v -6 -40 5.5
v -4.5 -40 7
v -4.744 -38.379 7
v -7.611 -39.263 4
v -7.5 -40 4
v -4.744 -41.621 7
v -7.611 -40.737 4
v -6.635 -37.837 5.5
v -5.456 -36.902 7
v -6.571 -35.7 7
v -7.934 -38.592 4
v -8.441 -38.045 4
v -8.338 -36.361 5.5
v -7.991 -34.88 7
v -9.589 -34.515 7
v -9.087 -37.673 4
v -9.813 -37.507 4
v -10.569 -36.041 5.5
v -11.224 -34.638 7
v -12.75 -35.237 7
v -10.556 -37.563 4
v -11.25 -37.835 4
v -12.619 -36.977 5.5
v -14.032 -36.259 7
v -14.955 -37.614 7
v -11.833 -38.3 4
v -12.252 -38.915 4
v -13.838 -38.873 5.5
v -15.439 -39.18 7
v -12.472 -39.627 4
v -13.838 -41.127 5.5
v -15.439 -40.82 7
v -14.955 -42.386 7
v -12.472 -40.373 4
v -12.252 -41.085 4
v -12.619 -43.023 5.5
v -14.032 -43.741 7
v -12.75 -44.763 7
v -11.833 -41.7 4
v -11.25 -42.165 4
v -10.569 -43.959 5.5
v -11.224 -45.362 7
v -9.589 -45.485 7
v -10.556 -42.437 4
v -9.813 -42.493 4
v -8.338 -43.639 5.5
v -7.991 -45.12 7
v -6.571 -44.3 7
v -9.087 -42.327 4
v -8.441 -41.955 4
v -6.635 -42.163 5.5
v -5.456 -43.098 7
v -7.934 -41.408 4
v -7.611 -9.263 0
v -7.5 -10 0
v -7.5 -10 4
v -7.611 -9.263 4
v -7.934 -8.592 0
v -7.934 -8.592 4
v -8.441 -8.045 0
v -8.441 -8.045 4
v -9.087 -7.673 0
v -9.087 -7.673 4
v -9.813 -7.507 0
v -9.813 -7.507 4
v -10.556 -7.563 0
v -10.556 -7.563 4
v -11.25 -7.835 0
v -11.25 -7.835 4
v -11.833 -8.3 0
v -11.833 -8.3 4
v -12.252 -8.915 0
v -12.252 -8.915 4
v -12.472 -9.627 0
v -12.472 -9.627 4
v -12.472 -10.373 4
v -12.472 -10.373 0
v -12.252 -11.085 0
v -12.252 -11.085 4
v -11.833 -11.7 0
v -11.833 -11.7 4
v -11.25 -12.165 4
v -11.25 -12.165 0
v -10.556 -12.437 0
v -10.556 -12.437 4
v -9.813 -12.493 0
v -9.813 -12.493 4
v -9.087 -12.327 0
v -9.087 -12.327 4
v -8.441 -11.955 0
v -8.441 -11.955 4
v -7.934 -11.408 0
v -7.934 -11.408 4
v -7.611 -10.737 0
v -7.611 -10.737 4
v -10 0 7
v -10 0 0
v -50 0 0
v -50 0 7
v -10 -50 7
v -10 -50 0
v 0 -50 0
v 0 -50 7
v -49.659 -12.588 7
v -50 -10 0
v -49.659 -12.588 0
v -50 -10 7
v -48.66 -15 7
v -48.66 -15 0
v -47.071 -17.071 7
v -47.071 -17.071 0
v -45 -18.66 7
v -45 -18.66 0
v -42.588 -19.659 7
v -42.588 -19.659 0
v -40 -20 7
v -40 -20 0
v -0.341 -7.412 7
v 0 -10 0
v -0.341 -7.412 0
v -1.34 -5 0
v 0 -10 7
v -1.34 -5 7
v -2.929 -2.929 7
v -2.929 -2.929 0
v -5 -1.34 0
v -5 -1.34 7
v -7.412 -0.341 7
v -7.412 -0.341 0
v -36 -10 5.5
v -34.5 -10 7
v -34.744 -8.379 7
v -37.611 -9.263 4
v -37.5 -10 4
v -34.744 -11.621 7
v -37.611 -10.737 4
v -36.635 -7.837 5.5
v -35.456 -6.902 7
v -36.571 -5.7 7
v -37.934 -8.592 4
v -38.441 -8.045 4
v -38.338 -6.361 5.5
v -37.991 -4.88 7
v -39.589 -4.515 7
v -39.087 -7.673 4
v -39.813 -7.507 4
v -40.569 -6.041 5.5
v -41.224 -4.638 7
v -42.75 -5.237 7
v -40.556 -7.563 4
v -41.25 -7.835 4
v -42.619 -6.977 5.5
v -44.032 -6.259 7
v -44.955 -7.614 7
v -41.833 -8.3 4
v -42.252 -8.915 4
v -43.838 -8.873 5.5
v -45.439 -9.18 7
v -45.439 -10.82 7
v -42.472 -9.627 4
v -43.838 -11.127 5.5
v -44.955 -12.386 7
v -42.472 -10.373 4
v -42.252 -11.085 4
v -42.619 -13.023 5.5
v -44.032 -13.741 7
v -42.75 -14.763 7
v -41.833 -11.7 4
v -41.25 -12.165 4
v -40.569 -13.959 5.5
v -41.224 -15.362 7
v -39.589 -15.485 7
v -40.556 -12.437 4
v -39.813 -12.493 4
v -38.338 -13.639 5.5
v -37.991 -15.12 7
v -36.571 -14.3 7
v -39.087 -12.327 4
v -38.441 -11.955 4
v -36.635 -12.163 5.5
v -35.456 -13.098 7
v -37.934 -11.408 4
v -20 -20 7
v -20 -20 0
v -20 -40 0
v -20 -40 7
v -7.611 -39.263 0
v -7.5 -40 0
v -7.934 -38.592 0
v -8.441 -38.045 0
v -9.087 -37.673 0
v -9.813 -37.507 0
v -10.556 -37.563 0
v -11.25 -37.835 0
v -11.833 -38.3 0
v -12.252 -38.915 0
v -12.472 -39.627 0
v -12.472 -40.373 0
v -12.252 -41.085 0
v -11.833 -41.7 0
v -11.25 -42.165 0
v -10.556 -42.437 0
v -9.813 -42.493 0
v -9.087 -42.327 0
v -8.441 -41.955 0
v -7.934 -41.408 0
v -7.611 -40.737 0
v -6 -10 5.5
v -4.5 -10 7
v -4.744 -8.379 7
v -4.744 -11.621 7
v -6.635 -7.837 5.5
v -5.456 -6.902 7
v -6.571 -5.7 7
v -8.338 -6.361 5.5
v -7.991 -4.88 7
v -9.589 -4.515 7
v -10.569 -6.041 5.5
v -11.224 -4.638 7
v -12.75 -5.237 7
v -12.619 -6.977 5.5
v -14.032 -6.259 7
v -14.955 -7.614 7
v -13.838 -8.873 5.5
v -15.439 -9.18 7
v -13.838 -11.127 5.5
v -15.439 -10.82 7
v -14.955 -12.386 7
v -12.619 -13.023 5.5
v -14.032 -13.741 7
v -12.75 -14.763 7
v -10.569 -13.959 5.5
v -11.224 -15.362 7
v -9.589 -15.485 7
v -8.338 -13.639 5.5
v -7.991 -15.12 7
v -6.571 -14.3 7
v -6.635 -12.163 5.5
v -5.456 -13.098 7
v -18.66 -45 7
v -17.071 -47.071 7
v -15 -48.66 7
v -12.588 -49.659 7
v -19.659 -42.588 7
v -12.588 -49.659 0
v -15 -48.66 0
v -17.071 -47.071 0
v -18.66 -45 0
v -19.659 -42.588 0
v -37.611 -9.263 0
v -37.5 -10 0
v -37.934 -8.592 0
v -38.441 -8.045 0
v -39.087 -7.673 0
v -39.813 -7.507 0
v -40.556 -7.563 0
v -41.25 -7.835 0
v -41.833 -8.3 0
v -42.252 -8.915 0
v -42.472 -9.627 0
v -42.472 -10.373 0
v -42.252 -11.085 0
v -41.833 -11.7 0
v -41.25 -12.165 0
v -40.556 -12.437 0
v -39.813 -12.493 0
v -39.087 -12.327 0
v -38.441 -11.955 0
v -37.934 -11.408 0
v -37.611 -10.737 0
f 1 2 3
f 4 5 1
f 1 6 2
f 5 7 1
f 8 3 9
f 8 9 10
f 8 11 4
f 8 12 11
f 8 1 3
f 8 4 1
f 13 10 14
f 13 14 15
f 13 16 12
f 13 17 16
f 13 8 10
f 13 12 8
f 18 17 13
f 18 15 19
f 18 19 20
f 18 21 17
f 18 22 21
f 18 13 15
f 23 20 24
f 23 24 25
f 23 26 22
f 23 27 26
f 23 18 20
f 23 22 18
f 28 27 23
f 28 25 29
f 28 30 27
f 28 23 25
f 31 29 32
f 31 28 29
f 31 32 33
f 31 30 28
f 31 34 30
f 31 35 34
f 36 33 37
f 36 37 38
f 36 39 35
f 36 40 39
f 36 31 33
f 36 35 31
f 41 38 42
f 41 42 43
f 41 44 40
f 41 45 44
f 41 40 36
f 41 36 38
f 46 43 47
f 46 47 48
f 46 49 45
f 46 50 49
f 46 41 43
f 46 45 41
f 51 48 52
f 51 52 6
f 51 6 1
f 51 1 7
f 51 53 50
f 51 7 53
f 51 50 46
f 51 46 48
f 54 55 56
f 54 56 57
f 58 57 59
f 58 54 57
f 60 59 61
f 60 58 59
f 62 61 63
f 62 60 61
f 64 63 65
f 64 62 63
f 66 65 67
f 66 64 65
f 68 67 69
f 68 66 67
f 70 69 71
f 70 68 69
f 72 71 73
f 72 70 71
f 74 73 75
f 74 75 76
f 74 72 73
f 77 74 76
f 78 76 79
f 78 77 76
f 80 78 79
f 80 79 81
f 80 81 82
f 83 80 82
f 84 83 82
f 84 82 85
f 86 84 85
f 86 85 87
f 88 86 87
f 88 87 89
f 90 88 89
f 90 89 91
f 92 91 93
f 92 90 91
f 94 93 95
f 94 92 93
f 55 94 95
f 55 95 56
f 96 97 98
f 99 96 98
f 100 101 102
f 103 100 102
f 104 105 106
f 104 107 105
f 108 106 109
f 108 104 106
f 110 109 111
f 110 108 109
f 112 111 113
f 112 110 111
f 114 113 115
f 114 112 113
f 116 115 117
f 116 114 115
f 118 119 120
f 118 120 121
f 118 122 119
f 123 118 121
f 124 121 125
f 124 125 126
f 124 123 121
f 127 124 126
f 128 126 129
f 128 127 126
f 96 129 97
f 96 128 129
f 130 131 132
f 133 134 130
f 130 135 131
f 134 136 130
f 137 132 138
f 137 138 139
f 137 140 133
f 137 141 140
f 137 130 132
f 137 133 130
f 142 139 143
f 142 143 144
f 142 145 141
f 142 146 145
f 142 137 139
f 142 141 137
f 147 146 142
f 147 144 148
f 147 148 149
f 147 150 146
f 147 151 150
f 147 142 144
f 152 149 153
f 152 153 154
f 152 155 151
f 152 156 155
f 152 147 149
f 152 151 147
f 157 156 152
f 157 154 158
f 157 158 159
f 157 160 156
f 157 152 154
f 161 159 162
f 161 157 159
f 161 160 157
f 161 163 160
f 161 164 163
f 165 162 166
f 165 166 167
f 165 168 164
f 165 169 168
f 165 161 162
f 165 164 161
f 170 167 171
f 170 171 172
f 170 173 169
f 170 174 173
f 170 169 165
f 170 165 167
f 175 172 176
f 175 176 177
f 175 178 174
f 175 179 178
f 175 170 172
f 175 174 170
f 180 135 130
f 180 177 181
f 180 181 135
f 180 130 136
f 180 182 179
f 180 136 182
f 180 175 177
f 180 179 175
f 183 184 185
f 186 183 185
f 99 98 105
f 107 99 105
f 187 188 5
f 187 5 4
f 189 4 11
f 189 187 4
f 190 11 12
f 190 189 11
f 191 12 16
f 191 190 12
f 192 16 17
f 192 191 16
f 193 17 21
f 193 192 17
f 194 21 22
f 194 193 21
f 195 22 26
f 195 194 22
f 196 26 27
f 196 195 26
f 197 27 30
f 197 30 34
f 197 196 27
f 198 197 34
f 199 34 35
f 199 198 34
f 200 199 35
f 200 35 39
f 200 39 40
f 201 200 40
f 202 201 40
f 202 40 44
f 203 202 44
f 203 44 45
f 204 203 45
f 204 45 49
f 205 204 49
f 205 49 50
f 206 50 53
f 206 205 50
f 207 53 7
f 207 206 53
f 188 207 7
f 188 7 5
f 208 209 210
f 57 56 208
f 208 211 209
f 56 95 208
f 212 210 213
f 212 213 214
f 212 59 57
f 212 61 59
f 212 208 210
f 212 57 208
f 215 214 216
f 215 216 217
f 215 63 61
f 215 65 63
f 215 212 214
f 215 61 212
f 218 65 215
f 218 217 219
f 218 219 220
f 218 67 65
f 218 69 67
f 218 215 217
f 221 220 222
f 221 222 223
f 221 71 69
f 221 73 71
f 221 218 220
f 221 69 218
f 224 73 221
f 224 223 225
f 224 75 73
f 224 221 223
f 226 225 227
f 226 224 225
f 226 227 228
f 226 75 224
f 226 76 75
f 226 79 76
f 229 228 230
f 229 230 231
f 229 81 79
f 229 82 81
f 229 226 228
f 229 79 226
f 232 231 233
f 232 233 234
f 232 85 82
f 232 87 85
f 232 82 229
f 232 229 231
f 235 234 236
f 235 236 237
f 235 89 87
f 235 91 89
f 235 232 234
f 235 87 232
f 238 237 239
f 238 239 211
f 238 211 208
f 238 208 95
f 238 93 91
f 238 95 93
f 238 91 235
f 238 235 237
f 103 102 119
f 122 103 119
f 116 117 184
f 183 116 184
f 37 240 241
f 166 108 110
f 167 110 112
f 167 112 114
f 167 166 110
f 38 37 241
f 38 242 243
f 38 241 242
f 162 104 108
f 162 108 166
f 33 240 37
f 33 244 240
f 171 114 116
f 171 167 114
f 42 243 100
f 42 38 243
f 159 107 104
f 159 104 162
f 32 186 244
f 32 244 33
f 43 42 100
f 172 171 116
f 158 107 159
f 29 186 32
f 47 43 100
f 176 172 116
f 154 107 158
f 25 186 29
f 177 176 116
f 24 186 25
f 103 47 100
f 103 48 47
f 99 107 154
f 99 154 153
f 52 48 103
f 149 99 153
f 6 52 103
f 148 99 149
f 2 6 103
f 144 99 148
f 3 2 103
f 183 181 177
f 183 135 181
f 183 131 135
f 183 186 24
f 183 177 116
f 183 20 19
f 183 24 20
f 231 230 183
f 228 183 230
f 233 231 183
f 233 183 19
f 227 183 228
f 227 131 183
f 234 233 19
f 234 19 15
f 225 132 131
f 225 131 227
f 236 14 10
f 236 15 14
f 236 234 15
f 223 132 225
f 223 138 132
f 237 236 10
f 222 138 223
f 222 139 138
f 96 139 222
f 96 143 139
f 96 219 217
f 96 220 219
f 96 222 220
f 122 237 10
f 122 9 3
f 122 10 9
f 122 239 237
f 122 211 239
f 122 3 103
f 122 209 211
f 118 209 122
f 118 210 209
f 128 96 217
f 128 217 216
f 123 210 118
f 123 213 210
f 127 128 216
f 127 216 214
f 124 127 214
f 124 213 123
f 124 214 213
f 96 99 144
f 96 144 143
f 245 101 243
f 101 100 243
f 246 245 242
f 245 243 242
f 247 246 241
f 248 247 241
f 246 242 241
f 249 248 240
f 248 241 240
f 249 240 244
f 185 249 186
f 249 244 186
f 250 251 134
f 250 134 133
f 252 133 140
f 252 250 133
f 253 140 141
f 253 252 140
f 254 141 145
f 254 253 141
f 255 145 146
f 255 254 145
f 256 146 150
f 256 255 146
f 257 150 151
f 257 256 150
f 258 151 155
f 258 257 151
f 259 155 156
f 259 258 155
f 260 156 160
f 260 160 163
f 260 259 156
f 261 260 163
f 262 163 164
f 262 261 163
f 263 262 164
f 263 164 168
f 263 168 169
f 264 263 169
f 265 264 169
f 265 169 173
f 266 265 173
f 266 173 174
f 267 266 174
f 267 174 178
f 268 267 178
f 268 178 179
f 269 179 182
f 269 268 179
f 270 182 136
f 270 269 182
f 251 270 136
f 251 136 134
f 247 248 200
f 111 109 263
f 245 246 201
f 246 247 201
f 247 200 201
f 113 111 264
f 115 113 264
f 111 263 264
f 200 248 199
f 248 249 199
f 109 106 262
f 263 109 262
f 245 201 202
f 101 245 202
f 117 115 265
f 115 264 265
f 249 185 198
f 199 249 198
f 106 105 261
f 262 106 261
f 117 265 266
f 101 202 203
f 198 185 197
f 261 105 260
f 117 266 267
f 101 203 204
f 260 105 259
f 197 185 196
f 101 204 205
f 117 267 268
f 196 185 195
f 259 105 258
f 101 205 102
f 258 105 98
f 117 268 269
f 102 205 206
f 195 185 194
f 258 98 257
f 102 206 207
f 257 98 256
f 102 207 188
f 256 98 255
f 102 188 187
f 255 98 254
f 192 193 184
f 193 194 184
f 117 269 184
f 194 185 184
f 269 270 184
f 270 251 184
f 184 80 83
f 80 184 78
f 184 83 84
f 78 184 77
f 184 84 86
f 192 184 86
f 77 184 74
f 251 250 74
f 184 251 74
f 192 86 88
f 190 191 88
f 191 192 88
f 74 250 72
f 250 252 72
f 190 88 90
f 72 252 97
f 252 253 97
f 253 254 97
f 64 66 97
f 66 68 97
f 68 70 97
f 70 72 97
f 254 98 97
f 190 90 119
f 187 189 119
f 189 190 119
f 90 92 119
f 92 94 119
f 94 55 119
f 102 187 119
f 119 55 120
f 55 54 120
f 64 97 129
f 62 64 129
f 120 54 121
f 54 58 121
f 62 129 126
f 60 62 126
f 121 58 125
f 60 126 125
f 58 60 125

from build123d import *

# Parameters (mm, degrees)
F0_R     = 2.5
F1_DEPTH = 7
F2_R     = 10
F3_SIZE  = 3


# Not quite as in the source:
# - a feature names something its author has since deleted; it is built from what else it names


with BuildPart() as f1:
    # F0 (on Top) → F1 (new body)
    with BuildSketch(Plane.XY):
        Polygon((0, -50), (0, 0), (-50, 0), (-50, -20), (-20, -20), (-20, -50), align=None)
        with Locations((-10, -40)):
            Circle(F0_R, mode=Mode.SUBTRACT)
        with Locations((-40, -10)):
            Circle(F0_R, mode=Mode.SUBTRACT)
        with Locations((-10, -10)):
            Circle(F0_R, mode=Mode.SUBTRACT)
    extrude(amount=F1_DEPTH)

    # F2
    f2_edges = [f1.edges().sort_by_distance(p)[0] for p in [
        (0, 0, 3.5),
        (-20, -50, 3.5),
        (-50, -20, 3.5),
    ]]
    fillet(f2_edges, radius=F2_R)

    # F3
    f3_edges = [f1.edges().sort_by_distance(p)[0] for p in [
        (-42.5, -10, 7),
        (-12.5, -40, 7),
        (-12.5, -10, 7),
    ]]
    chamfer(f3_edges, length=F3_SIZE)


solid = f1.part
